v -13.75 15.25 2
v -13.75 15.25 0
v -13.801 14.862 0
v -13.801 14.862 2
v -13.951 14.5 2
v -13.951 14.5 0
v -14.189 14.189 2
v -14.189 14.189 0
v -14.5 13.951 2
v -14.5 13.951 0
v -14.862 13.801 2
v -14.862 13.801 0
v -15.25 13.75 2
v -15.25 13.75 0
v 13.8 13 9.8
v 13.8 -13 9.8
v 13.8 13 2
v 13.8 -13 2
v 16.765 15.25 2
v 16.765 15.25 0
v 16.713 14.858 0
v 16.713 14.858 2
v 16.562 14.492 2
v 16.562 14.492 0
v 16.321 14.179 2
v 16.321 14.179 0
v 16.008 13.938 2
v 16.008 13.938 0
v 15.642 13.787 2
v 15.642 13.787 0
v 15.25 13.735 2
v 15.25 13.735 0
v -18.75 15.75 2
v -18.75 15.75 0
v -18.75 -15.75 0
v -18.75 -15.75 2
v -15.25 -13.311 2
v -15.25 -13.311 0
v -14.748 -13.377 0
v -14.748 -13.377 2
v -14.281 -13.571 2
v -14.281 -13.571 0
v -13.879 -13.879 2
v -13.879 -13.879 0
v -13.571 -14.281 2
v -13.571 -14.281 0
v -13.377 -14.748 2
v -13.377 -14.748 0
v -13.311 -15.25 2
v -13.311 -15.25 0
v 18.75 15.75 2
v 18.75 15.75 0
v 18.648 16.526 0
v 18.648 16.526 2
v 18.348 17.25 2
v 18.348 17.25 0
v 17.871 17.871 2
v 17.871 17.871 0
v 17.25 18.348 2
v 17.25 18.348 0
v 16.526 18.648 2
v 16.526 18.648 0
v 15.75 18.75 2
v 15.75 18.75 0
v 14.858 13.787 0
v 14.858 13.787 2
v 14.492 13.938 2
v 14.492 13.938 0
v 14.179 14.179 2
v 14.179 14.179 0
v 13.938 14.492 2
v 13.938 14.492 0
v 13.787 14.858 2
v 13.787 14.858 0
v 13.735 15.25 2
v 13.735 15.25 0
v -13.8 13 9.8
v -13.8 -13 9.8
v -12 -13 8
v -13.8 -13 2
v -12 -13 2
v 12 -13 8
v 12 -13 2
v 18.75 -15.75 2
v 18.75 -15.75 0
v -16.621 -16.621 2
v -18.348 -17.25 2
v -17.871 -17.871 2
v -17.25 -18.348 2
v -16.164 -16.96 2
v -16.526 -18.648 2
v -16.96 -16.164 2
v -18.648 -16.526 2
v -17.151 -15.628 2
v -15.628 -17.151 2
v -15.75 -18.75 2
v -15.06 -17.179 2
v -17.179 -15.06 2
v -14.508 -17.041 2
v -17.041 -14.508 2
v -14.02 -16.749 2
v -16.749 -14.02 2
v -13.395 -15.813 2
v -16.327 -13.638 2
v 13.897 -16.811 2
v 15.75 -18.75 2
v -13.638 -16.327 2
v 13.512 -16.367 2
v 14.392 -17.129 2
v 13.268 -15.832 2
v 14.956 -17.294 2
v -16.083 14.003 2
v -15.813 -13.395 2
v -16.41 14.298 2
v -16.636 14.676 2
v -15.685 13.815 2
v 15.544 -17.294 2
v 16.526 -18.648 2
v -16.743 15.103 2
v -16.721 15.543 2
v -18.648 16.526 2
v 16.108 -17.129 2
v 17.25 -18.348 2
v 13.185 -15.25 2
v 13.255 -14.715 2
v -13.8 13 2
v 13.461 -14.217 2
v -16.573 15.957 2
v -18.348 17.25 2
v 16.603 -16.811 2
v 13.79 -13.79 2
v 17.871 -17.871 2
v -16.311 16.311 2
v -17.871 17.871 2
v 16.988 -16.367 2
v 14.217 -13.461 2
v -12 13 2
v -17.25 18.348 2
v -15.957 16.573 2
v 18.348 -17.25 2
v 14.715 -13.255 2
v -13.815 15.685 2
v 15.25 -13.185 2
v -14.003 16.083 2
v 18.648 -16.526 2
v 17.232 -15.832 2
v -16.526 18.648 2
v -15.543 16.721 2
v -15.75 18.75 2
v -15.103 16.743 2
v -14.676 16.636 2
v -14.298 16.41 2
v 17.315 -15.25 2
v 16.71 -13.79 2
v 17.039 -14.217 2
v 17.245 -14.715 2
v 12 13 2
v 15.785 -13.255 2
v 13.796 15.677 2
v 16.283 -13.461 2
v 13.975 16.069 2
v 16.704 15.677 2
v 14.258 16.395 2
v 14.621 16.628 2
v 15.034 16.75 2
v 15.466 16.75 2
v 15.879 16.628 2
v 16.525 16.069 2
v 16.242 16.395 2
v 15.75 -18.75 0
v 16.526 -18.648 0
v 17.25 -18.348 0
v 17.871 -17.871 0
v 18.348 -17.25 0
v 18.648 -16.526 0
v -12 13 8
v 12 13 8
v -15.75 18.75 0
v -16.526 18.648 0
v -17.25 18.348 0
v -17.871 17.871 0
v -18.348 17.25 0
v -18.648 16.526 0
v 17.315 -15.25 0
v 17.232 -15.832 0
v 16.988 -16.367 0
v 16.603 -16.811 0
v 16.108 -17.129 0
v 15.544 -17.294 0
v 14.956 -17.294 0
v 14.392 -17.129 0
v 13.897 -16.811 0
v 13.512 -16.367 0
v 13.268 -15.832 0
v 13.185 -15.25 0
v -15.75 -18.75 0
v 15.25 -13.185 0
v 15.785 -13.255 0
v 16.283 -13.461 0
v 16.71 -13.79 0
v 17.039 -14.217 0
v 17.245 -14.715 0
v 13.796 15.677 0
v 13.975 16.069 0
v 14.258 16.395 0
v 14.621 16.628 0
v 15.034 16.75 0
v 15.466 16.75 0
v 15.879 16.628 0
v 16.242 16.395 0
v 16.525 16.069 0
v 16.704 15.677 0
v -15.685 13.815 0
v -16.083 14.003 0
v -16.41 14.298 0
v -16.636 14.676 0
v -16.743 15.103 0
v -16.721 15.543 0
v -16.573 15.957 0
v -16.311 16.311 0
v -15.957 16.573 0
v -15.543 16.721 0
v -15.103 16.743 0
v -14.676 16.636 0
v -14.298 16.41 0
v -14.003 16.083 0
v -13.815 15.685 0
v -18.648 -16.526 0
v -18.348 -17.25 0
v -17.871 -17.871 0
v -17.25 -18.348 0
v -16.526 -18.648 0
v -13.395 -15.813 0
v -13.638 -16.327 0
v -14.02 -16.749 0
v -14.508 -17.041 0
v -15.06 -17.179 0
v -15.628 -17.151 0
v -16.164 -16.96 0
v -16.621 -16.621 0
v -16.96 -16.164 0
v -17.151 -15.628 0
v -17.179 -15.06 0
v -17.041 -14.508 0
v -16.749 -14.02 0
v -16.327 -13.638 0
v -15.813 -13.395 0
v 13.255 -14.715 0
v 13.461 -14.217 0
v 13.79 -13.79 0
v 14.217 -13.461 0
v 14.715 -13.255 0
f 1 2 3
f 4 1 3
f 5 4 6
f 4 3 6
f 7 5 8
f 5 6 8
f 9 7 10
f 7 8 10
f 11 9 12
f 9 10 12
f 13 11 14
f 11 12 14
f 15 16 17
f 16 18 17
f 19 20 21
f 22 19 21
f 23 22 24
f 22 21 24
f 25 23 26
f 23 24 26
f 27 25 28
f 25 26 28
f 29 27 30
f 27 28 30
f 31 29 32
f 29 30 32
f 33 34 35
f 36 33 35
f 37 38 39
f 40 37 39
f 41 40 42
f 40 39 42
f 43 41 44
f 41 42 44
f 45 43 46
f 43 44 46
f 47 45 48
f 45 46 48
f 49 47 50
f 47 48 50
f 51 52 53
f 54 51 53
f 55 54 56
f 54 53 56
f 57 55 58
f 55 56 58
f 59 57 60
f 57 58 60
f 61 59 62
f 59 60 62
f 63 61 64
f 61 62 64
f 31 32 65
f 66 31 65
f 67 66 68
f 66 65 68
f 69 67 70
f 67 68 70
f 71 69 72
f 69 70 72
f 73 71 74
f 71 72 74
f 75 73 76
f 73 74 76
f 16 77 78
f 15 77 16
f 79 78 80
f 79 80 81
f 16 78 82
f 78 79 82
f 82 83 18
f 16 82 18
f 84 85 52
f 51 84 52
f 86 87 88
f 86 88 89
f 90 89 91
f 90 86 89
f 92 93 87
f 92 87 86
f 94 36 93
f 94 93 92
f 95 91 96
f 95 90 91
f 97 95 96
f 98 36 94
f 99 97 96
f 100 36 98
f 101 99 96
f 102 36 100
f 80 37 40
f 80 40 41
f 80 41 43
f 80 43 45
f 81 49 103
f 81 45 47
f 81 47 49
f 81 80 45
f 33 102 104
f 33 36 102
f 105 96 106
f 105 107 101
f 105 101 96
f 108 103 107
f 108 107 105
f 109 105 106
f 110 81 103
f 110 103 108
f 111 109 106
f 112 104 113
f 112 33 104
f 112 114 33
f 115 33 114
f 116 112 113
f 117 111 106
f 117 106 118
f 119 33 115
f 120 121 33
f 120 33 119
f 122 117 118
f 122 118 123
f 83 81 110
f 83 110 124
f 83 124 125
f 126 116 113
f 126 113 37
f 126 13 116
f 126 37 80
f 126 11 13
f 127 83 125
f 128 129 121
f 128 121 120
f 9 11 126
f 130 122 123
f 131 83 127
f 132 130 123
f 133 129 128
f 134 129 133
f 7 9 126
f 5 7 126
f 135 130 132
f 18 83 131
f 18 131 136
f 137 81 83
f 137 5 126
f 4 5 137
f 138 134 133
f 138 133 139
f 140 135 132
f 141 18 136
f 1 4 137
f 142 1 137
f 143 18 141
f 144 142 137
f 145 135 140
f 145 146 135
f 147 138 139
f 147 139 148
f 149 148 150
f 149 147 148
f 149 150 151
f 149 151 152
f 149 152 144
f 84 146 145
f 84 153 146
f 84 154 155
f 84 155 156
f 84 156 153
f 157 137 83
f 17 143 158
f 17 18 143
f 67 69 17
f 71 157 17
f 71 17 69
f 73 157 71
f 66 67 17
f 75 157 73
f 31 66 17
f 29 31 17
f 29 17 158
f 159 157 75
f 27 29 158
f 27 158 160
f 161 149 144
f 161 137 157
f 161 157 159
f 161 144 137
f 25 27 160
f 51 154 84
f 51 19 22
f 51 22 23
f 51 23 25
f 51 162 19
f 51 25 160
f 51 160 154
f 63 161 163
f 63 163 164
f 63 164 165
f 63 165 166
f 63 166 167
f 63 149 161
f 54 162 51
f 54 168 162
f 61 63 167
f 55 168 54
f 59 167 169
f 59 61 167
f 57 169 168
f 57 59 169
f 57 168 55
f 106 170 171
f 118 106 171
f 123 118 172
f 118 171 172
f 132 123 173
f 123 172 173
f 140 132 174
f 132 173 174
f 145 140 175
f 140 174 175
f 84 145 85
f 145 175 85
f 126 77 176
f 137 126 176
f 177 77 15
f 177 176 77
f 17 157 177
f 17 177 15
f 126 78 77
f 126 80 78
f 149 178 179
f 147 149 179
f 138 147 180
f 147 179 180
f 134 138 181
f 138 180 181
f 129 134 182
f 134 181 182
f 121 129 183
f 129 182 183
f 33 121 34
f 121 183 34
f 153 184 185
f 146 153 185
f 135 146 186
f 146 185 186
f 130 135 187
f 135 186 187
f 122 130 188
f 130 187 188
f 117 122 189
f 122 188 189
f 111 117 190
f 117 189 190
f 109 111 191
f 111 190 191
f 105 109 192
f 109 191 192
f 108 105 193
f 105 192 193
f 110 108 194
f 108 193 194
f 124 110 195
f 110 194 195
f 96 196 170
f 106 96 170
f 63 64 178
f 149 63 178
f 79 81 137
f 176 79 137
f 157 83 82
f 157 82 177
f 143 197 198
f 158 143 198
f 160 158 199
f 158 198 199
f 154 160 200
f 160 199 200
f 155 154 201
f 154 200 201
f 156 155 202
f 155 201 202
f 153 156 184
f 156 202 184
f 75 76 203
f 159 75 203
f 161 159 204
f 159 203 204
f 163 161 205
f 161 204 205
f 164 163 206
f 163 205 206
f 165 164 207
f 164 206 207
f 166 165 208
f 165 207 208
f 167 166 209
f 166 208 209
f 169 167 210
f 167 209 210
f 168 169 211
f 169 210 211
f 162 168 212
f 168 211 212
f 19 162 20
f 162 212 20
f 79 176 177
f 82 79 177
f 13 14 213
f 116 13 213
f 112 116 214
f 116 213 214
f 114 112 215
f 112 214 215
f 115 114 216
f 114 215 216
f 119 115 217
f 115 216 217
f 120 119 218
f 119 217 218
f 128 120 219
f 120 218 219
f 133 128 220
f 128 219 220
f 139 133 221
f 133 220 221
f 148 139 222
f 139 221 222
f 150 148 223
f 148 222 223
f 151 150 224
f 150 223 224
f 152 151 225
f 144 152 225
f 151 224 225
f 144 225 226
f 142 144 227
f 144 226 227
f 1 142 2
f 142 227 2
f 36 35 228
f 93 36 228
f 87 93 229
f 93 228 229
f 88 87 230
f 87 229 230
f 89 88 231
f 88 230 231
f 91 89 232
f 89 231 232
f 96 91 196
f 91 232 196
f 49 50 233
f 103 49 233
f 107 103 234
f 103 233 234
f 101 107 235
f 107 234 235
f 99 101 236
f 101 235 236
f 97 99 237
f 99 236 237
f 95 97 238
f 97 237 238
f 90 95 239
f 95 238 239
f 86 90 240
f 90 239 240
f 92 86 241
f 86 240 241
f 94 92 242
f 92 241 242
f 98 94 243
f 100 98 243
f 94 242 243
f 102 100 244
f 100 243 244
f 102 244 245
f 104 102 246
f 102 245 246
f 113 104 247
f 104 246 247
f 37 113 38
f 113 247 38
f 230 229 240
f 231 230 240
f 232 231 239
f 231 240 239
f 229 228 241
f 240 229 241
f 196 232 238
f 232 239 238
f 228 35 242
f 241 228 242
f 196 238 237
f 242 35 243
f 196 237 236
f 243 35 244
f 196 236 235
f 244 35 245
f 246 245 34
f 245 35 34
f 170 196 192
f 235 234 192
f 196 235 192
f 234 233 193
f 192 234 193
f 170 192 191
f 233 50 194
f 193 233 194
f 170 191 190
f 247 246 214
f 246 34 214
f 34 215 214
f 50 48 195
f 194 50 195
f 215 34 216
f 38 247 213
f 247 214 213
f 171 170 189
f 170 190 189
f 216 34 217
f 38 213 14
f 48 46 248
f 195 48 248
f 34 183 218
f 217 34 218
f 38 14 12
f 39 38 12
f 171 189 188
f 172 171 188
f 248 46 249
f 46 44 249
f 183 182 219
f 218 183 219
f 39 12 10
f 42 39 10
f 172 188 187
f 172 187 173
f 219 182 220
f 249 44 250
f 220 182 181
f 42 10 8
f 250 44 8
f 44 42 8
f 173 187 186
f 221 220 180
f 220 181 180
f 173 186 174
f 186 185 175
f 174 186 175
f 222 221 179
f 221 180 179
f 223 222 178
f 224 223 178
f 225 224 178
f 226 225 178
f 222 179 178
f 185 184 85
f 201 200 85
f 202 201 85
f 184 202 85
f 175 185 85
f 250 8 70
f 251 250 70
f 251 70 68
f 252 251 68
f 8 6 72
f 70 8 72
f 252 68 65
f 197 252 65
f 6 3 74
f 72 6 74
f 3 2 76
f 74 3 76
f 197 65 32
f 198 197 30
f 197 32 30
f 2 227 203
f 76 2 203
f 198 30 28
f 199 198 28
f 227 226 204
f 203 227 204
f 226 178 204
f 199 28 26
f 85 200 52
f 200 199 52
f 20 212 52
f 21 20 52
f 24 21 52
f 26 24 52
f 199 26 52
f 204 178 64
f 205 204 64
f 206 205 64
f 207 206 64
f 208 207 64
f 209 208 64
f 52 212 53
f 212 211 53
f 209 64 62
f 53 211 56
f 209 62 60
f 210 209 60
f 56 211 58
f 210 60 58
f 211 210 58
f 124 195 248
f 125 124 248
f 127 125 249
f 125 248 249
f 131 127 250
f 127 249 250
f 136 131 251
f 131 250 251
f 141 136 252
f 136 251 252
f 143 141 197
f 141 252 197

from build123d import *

# Parameters (mm, degrees)
F1_DEPTH = 2
F2_W     = 1.8
F2_H     = 26
F3_DEPTH = 8
F4_W     = 27.6
F4_H     = 26
F5_DEPTH = 1.8


with BuildPart() as f1:
    # F0 (on Top) → F1 (new body)
    with BuildSketch(Plane.XY):
        with BuildLine():
            Line((15.75, 18.75), (-15.75, 18.75))
            ThreePointArc((-15.75, 18.75), (-17.8713203436, 17.8713203436), (-18.75, 15.75))
            Line((-18.75, 15.75), (-18.75, -15.75))
            ThreePointArc((-18.75, -15.75), (-17.8713203436, -17.8713203436), (-15.75, -18.75))
            Line((-15.75, -18.75), (15.75, -18.75))
            ThreePointArc((15.75, -18.75), (17.8713203436, -17.8713203436), (18.75, -15.75))
            Line((18.75, -15.75), (18.75, 15.75))
            ThreePointArc((18.75, 15.75), (17.8713203436, 17.8713203436), (15.75, 18.75))
        make_face()
        with BuildLine():
            ThreePointArc((-15.25, 13.75), (-16.3106601718, 16.3106601718), (-13.75, 15.25))
            Line((-13.75, 15.25), (13.734903335, 15.25))
            ThreePointArc((13.734903335, 15.25), (15.25, 16.765096665), (16.765096665, 15.25))
            ThreePointArc((16.765096665, 15.25), (16.321335126, 14.178664874), (15.25, 13.734903335))
            Line((15.25, 13.734903335), (15.25, -13.1845953413))
            ThreePointArc((15.25, -13.1845953413), (16.7104616401, -13.7895383599), (17.3154046587, -15.25))
            ThreePointArc((17.3154046587, -15.25), (15.25, -17.3154046587), (13.1845953413, -15.25))
            Line((13.1845953413, -15.25), (-13.3112718243, -15.25))
            ThreePointArc((-13.3112718243, -15.25), (-16.6208878399, -16.6208878399), (-15.25, -13.3112718243))
            Line((-15.25, -13.3112718243), (-15.25, 13.75))
        make_face(mode=Mode.SUBTRACT)
        with BuildLine():
            Line((13.734903335, 15.25), (-13.75, 15.25))
            ThreePointArc((-13.75, 15.25), (-14.1893398282, 14.1893398282), (-15.25, 13.75))
            Line((-15.25, 13.75), (-15.25, -13.3112718243))
            ThreePointArc((-15.25, -13.3112718243), (-13.8791121601, -13.8791121601), (-13.3112718243, -15.25))
            Line((-13.3112718243, -15.25), (13.1845953413, -15.25))
            ThreePointArc((13.1845953413, -15.25), (13.7895383599, -13.7895383599), (15.25, -13.1845953413))
            Line((15.25, -13.1845953413), (15.25, 13.734903335))
            ThreePointArc((15.25, 13.734903335), (14.178664874, 14.178664874), (13.734903335, 15.25))
        make_face()
    extrude(amount=F1_DEPTH)

    # F2 (on Top) → F3 (join)
    with BuildSketch(Plane.XY):
        with Locations((-12.9, 0)):
            Rectangle(F2_W, F2_H)
        with Locations((12.9, 0)):
            Rectangle(F2_W, F2_H)
    extrude(amount=F3_DEPTH)

    # F4 (on face) → F5 (join)
    with BuildSketch(Plane.XY.offset(8)):
        Rectangle(F4_W, F4_H)
    extrude(amount=F5_DEPTH)


solid = f1.part
